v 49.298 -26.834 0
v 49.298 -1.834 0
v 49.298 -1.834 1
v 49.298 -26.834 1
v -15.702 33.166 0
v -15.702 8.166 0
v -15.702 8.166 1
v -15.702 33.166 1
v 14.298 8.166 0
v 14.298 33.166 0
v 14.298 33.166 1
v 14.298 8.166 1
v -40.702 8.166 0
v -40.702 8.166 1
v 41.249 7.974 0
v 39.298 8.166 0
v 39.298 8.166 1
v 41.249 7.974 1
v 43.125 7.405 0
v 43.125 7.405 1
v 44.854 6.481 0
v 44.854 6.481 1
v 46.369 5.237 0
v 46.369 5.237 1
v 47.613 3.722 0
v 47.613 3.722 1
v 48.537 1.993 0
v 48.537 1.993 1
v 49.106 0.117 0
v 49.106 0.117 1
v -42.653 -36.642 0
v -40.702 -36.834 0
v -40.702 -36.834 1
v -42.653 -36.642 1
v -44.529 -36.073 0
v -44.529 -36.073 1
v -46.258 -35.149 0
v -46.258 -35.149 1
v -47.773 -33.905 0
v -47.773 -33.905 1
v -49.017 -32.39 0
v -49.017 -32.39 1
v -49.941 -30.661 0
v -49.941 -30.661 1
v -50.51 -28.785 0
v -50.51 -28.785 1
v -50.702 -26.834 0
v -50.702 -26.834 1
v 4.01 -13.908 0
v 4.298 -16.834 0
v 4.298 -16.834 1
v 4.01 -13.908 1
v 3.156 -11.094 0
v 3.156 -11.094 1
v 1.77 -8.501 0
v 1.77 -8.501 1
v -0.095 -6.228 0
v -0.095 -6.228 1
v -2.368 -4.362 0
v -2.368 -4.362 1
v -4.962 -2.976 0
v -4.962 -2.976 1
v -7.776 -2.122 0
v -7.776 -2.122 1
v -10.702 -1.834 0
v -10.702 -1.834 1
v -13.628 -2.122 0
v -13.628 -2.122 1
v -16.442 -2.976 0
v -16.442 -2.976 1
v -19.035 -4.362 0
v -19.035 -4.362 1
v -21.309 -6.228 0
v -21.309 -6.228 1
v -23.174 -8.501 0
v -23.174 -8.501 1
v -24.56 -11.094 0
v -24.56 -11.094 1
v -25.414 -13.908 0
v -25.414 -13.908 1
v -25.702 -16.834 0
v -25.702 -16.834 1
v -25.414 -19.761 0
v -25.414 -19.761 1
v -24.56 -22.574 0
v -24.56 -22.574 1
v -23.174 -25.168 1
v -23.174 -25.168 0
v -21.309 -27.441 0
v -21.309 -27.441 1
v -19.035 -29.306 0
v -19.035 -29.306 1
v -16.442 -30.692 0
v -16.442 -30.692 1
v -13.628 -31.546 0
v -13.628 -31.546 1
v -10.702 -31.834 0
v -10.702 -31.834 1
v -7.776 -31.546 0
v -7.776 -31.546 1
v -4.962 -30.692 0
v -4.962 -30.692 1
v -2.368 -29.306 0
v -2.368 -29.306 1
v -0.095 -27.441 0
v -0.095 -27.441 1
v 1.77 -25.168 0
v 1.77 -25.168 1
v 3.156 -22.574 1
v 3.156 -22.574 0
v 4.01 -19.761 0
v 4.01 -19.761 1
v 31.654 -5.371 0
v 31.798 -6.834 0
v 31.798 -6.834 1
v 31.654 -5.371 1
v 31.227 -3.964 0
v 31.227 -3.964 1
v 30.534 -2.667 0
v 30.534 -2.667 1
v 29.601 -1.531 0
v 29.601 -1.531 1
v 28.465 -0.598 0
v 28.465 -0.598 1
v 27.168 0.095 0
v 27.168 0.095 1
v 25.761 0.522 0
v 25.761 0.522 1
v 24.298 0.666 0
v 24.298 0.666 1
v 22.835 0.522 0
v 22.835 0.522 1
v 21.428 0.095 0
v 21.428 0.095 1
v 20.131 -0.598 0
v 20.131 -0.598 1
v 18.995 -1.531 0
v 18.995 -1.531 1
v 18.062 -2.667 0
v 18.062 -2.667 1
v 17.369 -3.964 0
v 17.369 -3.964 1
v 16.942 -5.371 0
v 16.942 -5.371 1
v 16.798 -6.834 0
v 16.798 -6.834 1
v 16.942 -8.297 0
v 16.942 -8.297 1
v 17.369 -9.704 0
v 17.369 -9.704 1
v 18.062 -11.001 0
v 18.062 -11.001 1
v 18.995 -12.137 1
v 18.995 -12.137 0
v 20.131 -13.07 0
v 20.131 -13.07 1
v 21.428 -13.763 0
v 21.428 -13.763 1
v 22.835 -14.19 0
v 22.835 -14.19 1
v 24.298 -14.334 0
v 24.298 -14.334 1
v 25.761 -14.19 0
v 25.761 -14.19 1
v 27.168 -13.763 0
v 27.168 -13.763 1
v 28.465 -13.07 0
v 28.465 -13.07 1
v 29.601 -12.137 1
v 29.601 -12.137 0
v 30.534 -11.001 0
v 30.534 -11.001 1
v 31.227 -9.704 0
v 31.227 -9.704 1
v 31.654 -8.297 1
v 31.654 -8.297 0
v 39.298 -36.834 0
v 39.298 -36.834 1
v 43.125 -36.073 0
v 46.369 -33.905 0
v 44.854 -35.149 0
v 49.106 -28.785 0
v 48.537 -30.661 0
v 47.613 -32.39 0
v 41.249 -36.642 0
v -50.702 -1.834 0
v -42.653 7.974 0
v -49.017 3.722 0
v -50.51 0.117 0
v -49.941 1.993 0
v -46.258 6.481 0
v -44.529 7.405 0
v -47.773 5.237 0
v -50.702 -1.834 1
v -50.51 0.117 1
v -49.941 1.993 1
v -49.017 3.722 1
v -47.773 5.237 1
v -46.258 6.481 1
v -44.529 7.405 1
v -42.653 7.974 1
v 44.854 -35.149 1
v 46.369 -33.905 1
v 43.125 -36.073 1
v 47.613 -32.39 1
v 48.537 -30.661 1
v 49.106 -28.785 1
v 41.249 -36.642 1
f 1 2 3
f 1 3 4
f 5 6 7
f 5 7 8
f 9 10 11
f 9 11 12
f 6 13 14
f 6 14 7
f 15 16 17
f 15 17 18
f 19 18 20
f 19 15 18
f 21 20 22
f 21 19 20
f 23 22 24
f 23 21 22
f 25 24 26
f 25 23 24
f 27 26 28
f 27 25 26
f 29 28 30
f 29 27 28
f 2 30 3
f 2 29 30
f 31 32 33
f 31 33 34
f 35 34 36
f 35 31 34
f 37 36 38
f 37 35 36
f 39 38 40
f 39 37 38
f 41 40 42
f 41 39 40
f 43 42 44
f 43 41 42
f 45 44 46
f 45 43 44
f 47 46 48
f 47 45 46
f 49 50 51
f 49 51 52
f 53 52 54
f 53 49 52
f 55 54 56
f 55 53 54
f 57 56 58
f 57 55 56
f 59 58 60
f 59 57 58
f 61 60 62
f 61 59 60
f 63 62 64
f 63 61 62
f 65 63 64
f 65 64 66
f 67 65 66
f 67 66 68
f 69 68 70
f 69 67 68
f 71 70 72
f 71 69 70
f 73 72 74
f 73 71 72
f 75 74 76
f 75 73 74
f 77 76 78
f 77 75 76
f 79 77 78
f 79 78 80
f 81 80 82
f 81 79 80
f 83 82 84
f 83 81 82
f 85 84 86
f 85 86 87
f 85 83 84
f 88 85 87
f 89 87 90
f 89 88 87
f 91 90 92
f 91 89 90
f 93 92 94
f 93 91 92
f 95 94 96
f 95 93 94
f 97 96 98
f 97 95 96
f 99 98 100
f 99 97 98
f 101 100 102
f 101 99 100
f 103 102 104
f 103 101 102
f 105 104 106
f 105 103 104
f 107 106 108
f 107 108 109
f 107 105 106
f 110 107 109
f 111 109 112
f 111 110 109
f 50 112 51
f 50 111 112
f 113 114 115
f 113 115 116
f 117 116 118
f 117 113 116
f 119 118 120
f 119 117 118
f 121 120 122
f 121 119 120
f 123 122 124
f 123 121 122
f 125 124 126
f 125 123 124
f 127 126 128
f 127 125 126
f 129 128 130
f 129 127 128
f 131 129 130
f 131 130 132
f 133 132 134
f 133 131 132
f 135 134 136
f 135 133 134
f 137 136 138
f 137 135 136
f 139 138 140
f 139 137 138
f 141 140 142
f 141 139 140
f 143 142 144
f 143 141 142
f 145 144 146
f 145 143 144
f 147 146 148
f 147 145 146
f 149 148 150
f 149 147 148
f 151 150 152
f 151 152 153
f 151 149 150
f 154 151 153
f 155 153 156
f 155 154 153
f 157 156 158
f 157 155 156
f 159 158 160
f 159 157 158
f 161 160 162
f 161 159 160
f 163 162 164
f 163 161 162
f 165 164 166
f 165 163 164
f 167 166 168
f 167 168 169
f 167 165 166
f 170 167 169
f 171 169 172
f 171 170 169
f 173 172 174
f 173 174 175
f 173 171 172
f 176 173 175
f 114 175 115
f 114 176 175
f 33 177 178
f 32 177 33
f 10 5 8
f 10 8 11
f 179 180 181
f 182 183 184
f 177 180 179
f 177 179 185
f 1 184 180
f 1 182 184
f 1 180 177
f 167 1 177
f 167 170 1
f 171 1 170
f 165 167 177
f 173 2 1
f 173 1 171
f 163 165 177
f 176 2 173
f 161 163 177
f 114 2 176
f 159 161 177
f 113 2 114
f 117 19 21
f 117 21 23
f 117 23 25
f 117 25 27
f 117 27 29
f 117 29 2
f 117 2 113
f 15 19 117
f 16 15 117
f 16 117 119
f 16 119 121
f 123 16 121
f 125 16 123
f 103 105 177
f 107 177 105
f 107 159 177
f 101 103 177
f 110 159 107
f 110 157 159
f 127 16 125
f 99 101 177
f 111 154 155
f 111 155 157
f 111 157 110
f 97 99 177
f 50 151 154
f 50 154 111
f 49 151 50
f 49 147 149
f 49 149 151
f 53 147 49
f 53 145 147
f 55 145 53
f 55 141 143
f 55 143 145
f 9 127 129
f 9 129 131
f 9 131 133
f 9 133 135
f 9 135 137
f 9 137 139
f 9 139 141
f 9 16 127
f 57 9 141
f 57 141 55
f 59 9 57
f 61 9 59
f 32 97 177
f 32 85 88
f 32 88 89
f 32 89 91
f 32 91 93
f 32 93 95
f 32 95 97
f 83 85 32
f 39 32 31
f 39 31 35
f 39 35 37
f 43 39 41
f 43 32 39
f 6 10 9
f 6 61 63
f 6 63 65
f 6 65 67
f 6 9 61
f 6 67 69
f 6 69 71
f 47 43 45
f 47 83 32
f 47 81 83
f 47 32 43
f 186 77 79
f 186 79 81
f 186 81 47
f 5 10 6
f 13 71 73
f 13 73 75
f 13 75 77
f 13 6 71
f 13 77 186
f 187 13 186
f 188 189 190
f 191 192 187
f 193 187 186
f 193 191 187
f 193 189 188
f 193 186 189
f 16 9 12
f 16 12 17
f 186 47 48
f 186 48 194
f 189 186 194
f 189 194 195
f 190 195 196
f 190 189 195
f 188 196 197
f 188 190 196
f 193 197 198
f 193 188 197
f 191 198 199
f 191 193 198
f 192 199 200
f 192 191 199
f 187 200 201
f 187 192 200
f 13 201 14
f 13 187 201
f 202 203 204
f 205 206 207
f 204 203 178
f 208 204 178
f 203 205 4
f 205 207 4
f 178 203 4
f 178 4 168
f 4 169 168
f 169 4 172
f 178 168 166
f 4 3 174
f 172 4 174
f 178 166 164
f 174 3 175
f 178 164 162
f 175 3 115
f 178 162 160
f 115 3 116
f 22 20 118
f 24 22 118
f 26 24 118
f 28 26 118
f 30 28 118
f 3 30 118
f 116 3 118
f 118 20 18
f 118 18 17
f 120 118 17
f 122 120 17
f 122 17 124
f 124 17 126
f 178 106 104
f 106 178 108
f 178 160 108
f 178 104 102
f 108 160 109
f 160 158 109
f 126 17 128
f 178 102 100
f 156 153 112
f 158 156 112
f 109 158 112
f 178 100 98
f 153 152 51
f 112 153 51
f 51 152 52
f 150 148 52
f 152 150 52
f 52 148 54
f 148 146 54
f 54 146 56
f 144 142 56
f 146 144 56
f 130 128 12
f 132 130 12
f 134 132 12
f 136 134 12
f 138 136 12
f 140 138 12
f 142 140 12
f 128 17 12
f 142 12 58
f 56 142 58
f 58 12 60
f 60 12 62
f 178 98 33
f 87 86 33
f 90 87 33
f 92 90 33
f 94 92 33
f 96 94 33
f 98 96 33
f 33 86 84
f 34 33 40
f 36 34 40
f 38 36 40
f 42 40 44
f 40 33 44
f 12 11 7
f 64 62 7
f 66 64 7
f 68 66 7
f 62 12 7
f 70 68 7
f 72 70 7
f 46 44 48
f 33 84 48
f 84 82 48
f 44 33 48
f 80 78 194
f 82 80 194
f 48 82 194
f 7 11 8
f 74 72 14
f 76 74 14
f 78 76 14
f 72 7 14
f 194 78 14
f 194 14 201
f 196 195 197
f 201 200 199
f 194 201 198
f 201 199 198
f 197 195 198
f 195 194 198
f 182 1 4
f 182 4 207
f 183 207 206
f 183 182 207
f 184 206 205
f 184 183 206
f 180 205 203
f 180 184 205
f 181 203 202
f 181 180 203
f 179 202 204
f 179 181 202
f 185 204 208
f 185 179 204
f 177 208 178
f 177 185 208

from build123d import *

# Parameters (mm, degrees)
SKETCH1_R           = 15
SKETCH1_R_2         = 7.5
BOSS_EXTRUDE1_DEPTH = 1


with BuildPart() as part:
    # Sketch1 → Boss-Extrude1 (new body)
    with BuildSketch(Plane.XY):
        with BuildLine():
            Line((-15.701917229, 8.165829146), (-15.701917229, 33.165829146))
            Line((-15.701917229, 33.165829146), (14.298082771, 33.165829146))
            Line((14.298082771, 33.165829146), (14.298082771, 8.165829146))
            Line((14.298082771, 8.165829146), (39.298082771, 8.165829146))
            ThreePointArc((39.298082771, 8.165829146), (46.369150582, 5.236896958), (49.298082771, -1.834170854))
            Line((49.298082771, -1.834170854), (49.298082771, -26.834170854))
            ThreePointArc((49.298082771, -26.834170854), (46.369150582, -33.905238666), (39.298082771, -36.834170854))
            Line((39.298082771, -36.834170854), (-40.701917229, -36.834170854))
            ThreePointArc((-40.701917229, -36.834170854), (-47.772985041, -33.905238666), (-50.701917229, -26.834170854))
            Line((-50.701917229, -26.834170854), (-50.701917229, -1.834170854))
            ThreePointArc((-50.701917229, -1.834170854), (-47.772985041, 5.236896958), (-40.701917229, 8.165829146))
            Line((-40.701917229, 8.165829146), (-15.701917229, 8.165829146))
        make_face()
        with Locations((-10.701917229, -16.834170854)):
            Circle(SKETCH1_R, mode=Mode.SUBTRACT)
        with Locations((24.298082771, -6.834170854)):
            Circle(SKETCH1_R_2, mode=Mode.SUBTRACT)
    extrude(amount=BOSS_EXTRUDE1_DEPTH)


solid = part.part
